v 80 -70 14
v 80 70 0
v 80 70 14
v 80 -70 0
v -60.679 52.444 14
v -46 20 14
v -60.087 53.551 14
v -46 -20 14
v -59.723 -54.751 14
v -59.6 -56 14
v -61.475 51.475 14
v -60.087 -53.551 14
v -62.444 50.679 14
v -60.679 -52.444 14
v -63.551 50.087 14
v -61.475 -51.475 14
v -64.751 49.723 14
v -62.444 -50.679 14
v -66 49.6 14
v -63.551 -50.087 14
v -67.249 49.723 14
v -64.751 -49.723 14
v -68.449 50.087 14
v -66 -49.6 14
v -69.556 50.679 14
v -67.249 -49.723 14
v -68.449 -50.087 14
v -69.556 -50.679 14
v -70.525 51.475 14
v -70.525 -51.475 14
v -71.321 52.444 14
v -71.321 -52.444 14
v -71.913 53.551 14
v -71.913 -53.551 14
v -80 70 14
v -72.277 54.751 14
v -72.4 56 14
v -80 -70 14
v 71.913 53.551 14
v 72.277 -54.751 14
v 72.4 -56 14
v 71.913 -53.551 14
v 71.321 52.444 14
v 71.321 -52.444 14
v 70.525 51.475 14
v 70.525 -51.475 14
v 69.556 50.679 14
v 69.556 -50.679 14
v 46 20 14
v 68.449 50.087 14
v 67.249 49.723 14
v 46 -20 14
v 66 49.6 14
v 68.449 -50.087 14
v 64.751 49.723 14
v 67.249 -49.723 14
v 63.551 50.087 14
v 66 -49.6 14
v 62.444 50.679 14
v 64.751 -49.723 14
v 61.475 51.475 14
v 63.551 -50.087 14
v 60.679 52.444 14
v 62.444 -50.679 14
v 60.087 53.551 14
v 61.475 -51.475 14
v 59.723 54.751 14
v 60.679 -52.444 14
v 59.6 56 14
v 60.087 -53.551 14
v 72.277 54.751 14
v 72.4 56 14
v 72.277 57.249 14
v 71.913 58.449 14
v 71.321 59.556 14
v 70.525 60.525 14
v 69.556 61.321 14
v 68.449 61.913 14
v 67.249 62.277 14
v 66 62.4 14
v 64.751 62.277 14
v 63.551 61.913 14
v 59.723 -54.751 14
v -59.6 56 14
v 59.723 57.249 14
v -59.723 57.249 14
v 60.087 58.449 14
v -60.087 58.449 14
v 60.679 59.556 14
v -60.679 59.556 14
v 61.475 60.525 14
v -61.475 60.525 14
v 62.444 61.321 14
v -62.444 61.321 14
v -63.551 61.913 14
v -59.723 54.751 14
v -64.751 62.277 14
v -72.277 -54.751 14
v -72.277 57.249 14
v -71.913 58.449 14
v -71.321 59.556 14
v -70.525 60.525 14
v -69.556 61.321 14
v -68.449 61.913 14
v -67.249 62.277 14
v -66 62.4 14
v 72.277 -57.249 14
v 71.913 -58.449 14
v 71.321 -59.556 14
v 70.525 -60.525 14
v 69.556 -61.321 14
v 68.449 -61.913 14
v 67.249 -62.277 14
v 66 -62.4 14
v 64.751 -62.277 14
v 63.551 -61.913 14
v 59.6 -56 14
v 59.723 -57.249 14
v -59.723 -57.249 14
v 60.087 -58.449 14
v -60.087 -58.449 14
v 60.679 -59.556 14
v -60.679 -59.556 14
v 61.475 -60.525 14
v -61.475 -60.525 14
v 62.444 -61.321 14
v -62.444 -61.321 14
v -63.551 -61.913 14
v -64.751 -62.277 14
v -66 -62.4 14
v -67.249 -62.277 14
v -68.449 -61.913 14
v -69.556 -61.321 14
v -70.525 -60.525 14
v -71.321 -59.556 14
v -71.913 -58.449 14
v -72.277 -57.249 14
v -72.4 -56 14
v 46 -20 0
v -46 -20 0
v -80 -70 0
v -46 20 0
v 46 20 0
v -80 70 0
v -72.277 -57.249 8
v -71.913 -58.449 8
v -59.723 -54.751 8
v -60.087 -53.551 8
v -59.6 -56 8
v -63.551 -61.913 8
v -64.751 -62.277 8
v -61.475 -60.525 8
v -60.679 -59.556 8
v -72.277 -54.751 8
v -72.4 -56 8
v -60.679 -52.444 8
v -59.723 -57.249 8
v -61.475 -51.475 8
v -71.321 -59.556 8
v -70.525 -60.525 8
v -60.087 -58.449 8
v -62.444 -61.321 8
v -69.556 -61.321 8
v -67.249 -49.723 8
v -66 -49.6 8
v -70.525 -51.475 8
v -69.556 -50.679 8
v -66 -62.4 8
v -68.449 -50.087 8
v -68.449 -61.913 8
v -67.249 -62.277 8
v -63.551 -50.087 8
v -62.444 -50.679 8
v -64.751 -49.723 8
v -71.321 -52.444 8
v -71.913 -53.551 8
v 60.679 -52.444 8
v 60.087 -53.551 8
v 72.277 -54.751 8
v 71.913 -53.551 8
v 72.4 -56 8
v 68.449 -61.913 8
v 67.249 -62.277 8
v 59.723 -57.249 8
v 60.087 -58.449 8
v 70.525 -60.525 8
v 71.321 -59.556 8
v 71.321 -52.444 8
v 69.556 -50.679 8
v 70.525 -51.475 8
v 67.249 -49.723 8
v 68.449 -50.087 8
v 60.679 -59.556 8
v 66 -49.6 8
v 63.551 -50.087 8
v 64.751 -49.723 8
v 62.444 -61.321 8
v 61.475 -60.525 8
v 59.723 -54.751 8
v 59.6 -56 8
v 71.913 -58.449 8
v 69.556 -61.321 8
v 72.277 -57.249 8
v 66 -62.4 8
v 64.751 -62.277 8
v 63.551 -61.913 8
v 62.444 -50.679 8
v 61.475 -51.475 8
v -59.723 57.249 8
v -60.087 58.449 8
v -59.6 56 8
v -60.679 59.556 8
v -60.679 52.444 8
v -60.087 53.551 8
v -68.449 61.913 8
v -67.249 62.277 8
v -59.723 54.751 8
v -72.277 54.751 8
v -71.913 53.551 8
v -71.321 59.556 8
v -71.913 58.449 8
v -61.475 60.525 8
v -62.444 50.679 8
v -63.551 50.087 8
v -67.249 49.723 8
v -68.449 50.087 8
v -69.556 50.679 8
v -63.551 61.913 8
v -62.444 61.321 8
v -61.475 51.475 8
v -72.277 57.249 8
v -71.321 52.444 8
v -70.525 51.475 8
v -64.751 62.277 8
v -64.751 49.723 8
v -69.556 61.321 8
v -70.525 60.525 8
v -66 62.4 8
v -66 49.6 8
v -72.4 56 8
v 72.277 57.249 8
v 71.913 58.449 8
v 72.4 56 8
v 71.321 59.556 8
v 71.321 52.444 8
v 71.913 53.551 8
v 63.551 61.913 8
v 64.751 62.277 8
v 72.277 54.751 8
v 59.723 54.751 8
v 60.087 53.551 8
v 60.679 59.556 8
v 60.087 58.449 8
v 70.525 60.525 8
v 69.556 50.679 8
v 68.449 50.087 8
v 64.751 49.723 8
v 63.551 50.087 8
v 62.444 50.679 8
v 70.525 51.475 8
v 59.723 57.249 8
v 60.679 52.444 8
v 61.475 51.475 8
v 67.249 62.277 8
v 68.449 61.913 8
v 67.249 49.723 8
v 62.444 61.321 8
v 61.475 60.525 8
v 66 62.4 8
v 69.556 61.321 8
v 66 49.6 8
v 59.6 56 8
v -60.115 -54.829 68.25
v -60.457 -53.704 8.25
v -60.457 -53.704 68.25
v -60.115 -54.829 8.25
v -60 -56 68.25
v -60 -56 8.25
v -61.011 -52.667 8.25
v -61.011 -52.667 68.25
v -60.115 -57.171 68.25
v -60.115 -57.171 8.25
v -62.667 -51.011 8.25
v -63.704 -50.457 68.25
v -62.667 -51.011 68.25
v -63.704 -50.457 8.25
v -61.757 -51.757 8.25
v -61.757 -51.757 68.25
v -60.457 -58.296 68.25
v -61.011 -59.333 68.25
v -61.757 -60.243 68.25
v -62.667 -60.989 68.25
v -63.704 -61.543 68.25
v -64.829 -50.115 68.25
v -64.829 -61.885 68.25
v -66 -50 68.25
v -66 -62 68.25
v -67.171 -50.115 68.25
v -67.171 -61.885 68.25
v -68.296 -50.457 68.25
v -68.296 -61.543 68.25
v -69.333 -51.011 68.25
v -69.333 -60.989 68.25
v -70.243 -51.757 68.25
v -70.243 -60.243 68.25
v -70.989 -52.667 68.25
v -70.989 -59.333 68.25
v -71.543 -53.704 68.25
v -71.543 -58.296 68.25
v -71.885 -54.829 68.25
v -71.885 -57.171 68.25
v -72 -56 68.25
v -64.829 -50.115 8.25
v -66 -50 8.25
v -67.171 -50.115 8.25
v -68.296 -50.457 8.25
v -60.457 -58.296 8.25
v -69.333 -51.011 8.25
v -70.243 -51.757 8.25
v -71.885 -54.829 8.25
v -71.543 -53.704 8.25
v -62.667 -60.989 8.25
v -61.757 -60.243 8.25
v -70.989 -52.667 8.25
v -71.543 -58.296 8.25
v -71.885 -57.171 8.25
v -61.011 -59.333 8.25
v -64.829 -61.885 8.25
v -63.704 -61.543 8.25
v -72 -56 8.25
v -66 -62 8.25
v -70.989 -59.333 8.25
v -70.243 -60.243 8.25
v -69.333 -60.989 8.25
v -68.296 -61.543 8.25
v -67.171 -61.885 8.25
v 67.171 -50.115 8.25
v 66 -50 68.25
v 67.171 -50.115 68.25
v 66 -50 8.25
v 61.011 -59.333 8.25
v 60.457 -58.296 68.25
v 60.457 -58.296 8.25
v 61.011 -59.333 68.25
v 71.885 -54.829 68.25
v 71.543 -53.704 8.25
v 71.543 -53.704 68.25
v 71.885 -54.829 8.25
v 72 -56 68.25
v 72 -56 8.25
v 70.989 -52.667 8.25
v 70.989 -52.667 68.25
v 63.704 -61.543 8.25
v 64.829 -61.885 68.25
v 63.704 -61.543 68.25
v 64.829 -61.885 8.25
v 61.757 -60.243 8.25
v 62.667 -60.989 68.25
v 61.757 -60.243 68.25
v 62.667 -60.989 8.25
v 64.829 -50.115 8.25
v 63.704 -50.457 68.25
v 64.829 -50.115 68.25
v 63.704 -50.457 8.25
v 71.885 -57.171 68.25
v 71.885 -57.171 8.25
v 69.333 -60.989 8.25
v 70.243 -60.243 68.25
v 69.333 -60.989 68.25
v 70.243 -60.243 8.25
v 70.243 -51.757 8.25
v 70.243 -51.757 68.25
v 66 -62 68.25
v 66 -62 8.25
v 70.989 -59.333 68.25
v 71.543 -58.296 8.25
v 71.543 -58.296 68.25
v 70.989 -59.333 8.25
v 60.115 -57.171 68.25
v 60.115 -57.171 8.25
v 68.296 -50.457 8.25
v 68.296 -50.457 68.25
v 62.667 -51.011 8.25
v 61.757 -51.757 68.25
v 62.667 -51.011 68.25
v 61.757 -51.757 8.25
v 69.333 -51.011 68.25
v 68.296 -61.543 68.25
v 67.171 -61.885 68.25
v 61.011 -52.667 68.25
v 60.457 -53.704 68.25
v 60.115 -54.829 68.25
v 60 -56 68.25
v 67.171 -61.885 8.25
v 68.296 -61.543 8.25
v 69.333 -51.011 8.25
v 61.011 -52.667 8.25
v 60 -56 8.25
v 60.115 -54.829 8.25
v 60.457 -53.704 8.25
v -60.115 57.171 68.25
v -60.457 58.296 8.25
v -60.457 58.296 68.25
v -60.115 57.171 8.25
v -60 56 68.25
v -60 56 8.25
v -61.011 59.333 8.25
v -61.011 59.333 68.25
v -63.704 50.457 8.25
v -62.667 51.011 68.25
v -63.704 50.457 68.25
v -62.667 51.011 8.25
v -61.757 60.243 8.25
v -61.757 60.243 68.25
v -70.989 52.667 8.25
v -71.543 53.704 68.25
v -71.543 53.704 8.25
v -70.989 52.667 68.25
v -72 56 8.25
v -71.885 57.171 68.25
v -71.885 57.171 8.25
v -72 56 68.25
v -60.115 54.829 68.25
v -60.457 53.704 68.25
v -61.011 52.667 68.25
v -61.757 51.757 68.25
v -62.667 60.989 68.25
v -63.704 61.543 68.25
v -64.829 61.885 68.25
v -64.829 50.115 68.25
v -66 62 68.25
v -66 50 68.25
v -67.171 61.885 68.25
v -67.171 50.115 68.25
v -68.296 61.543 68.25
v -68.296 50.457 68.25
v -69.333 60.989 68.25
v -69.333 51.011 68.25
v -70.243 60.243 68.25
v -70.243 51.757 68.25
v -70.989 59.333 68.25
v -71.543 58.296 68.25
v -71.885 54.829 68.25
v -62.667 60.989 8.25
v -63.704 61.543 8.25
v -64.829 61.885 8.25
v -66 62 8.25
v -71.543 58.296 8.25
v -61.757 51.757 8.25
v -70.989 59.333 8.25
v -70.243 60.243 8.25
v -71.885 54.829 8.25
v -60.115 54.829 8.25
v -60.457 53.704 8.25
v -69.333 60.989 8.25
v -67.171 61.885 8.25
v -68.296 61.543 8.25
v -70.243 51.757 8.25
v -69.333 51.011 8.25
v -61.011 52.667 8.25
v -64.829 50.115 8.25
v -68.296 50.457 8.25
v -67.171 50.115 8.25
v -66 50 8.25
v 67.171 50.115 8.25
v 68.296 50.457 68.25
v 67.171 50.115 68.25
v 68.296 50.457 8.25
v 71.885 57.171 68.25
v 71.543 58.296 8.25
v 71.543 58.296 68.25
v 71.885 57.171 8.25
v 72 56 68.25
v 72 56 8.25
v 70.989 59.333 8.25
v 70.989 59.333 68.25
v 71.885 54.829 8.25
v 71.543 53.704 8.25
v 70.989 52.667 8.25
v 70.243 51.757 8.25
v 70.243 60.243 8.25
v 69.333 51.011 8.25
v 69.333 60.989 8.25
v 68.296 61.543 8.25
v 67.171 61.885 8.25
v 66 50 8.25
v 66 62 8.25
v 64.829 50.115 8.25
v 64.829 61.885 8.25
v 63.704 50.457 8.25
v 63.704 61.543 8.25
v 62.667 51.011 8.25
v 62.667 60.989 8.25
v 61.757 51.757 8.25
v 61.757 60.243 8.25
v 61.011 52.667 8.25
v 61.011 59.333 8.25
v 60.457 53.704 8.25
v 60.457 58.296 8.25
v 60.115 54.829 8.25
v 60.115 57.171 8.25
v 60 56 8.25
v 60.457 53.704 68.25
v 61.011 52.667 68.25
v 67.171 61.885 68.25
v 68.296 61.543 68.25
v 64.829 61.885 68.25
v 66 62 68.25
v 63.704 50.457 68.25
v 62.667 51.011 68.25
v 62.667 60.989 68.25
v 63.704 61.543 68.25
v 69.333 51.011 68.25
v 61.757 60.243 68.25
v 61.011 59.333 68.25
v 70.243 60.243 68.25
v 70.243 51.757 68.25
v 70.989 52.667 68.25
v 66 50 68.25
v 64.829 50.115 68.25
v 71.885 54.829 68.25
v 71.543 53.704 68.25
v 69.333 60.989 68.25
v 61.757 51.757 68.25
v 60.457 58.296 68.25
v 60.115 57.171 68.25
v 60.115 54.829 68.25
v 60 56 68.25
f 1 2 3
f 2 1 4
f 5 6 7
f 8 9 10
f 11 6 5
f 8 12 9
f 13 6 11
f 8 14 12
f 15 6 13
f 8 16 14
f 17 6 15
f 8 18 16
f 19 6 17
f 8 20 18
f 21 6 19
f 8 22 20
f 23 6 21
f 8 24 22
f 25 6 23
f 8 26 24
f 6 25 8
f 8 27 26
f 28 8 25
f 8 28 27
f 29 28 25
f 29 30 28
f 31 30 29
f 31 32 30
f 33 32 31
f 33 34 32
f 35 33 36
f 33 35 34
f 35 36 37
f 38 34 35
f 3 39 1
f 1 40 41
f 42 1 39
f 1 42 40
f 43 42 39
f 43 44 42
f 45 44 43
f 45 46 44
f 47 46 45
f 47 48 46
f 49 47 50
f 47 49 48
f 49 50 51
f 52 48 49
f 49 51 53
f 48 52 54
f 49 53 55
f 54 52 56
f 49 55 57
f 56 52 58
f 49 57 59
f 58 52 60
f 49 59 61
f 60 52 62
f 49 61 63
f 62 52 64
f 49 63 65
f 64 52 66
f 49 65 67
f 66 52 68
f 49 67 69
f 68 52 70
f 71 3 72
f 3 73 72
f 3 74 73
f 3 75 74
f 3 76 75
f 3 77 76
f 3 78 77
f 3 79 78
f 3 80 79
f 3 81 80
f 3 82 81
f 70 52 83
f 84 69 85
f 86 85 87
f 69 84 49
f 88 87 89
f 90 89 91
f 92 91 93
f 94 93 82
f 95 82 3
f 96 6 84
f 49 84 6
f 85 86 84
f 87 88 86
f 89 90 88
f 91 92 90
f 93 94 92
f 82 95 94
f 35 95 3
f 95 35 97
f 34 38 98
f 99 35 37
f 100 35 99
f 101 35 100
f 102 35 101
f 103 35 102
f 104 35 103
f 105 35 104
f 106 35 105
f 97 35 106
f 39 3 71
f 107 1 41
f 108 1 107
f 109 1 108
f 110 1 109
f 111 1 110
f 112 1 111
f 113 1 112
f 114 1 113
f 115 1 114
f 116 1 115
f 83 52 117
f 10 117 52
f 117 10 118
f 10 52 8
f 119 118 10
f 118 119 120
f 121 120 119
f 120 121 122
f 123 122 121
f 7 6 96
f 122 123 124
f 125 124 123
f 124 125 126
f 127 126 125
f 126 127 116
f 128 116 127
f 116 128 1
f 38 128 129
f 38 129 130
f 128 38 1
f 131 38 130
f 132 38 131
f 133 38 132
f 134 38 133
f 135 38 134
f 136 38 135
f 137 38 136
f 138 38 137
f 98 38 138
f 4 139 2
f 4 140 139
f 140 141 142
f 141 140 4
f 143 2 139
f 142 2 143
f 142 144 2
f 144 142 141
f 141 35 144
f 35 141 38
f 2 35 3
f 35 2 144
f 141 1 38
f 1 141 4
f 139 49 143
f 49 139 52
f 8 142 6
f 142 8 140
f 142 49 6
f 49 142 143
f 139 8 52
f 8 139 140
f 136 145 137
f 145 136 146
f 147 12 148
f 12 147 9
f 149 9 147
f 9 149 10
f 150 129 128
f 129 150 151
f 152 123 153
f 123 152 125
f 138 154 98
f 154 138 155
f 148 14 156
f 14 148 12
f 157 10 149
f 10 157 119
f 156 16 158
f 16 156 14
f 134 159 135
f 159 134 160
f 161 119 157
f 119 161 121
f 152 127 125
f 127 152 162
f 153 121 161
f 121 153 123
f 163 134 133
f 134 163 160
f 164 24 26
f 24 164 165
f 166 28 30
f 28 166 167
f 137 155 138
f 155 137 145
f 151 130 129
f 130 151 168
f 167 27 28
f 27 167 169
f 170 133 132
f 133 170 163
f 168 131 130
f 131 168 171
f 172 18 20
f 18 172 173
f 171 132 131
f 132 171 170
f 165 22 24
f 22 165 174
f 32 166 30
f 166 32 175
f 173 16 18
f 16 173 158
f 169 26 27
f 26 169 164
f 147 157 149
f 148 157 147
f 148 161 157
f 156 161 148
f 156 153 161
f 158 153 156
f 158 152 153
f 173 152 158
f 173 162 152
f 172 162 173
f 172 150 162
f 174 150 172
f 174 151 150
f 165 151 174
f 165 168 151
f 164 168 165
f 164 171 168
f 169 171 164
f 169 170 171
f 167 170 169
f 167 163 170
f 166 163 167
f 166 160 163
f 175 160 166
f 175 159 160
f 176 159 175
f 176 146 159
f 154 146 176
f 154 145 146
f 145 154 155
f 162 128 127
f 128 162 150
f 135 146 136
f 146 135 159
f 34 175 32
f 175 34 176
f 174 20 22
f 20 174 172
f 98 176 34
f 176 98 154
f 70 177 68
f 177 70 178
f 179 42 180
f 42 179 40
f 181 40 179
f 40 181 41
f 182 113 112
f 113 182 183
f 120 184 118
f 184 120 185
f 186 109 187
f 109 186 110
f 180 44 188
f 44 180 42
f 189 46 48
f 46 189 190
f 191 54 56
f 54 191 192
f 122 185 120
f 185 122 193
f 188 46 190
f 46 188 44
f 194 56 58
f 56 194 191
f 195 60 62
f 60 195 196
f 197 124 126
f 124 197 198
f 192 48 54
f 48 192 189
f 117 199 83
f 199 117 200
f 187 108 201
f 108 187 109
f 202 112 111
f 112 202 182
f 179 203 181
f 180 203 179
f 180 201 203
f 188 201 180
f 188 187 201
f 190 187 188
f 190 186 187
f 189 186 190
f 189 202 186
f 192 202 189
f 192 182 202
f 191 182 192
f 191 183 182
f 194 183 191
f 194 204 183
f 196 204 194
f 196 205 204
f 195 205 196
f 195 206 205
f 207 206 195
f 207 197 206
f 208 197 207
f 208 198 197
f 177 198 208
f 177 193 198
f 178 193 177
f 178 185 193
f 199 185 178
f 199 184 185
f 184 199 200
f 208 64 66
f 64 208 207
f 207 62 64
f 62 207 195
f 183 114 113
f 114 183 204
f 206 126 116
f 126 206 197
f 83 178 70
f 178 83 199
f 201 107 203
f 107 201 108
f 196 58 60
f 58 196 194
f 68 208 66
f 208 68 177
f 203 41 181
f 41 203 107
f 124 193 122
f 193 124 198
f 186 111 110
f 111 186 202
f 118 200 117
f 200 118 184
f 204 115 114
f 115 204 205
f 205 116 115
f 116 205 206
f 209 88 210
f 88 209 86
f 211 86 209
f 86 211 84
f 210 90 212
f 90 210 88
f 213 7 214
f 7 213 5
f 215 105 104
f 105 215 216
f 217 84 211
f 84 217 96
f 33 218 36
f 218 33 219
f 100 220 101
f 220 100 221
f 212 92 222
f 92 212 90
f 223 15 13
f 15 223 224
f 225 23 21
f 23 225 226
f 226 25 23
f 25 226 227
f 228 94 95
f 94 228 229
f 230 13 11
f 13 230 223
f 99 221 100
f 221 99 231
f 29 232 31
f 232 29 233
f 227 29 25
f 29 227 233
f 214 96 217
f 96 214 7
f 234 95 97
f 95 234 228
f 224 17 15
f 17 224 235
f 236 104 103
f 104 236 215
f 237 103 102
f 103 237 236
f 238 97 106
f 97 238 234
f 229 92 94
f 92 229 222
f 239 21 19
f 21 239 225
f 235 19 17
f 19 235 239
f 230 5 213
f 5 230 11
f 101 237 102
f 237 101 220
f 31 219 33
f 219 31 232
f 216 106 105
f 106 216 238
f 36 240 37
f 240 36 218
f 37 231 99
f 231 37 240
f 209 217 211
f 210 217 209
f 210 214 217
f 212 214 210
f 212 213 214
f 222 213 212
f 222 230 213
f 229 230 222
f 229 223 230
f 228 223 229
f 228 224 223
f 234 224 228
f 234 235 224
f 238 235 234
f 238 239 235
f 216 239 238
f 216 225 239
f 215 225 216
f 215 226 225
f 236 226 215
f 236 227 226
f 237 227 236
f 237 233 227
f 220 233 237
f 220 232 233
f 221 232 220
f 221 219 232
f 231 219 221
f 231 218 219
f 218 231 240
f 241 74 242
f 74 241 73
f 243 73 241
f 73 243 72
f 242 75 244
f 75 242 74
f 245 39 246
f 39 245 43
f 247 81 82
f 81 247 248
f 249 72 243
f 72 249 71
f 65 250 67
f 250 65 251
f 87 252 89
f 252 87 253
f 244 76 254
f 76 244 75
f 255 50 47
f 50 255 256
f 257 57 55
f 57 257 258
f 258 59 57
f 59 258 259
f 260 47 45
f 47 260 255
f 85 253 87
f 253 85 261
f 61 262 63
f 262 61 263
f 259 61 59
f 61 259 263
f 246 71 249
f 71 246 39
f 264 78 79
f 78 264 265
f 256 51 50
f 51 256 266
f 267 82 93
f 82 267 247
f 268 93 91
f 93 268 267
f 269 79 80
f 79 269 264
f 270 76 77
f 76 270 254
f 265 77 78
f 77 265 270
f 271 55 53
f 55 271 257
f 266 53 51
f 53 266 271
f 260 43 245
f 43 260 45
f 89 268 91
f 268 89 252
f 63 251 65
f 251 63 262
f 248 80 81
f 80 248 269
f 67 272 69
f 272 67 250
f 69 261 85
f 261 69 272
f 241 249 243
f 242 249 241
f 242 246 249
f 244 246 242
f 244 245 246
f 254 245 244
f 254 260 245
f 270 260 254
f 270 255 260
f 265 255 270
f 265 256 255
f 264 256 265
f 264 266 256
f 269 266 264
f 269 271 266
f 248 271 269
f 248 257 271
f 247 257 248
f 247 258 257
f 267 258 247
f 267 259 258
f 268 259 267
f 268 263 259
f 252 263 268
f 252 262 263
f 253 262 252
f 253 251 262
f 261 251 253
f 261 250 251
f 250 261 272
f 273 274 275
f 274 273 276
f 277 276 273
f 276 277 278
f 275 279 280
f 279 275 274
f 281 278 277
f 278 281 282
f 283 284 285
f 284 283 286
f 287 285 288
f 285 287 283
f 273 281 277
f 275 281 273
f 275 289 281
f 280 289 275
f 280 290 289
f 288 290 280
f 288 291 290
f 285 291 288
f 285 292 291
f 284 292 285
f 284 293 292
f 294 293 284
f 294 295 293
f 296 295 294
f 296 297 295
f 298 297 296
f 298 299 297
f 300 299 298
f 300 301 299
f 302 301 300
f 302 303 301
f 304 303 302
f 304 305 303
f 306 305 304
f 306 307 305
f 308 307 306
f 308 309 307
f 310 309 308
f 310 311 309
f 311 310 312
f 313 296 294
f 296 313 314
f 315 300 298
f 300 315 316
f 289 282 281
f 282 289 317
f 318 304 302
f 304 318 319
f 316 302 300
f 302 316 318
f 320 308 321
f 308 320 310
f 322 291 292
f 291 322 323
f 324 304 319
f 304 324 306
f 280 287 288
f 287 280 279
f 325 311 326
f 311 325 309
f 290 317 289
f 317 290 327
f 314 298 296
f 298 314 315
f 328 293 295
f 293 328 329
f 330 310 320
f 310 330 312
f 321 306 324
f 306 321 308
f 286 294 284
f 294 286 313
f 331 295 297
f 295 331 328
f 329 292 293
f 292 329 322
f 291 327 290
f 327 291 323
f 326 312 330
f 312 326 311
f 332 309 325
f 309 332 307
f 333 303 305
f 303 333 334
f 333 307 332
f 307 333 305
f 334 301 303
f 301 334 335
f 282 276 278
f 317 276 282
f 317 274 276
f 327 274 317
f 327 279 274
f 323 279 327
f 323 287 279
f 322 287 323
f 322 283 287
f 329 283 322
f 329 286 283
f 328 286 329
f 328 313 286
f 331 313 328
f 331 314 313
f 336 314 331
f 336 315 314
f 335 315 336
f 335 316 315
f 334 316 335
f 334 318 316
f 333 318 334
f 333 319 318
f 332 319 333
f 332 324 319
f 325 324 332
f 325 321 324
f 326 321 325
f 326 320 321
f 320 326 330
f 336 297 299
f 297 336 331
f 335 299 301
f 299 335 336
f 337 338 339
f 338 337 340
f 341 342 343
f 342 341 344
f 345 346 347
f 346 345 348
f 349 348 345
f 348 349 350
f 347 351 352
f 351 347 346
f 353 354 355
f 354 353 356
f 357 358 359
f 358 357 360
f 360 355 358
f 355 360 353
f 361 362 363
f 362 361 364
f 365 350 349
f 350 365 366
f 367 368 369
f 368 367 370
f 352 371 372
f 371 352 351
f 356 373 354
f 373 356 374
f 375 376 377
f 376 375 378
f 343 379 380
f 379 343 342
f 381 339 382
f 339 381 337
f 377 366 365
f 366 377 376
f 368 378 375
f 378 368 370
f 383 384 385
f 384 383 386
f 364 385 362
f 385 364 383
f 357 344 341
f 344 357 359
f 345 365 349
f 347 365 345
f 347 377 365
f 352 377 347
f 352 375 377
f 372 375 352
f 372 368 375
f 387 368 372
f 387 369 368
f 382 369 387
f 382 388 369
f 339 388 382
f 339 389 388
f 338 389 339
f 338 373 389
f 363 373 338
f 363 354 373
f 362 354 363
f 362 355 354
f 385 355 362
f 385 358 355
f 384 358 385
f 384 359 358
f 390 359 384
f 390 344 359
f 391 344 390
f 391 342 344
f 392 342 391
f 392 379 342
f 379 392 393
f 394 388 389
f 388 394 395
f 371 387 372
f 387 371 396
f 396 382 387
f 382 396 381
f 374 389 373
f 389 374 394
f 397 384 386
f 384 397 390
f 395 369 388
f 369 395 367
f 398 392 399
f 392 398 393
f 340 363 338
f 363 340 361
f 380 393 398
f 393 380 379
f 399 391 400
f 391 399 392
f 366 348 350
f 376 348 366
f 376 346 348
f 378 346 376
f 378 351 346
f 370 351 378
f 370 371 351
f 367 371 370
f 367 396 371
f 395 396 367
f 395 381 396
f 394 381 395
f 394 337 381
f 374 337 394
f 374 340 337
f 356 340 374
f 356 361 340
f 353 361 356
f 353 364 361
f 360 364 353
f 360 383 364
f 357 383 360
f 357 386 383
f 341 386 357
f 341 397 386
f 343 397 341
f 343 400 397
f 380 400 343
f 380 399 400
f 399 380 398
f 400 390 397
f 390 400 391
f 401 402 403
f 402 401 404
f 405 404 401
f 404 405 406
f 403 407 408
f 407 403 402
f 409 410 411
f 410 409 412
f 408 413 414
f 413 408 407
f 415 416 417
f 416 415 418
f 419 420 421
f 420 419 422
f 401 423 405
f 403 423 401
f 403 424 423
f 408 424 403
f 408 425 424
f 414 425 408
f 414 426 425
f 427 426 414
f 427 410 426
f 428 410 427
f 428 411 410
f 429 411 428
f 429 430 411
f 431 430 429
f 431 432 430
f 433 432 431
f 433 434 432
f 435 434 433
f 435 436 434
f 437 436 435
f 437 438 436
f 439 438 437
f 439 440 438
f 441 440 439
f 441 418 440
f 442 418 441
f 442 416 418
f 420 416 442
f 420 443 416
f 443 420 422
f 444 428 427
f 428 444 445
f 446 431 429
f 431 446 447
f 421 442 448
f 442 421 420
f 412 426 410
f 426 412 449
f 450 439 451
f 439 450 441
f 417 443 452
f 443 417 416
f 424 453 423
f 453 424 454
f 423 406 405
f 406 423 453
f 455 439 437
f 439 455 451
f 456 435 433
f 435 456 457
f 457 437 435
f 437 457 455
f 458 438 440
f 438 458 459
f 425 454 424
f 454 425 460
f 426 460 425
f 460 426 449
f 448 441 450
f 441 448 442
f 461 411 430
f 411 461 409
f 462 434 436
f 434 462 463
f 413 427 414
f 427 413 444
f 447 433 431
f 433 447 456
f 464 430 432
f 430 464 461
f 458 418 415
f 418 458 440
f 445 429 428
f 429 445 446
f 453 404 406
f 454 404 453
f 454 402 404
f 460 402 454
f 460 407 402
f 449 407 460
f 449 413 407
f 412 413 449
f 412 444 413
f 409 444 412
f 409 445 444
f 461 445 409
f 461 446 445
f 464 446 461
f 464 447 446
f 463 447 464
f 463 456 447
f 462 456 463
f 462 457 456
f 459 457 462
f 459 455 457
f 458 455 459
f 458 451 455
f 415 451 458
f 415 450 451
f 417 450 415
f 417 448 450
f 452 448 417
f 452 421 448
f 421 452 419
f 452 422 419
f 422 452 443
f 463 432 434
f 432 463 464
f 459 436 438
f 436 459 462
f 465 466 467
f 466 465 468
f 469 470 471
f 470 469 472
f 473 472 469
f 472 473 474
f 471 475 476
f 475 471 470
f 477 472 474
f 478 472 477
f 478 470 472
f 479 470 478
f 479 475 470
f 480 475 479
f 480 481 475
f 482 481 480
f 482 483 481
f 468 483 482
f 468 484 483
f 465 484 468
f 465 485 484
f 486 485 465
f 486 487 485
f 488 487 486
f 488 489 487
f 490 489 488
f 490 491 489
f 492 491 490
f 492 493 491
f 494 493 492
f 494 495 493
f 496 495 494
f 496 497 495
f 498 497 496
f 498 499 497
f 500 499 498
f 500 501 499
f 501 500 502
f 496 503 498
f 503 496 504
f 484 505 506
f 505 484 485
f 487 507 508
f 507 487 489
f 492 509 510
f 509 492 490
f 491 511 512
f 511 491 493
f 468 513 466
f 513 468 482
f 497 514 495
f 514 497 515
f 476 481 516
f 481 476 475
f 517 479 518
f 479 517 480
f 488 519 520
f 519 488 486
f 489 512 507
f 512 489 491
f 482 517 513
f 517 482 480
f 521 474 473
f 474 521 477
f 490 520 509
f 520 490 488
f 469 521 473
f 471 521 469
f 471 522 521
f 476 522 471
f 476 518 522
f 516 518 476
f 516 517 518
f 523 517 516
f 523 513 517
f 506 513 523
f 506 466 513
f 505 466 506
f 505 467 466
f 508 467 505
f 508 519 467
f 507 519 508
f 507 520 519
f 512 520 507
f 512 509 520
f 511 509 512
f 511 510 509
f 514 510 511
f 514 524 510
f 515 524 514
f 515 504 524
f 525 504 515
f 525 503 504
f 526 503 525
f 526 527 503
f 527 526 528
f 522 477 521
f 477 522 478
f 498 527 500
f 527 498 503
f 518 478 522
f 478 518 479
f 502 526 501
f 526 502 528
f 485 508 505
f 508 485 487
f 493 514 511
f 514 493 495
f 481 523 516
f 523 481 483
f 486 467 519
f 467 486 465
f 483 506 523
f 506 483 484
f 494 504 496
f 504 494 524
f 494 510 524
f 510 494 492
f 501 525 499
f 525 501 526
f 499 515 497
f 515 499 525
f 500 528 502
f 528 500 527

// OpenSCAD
$fn = 32;

// ------------------------------------------------------------------------
// Frame with four posts: 160 x 140 mm frame, four d12 posts
// Every part is its own module, assembly() places them once.
// ------------------------------------------------------------------------

// --- part 1 ---
module base_frame() {
  difference() {
    translate([-80, -70, 0]) cube([160, 140, 14]);
    translate([-46, -20, -1]) cube([92, 40, 16]);
    translate([-66, -56, 8]) cylinder(h = 7, d = 12.8);
    translate([66, -56, 8]) cylinder(h = 7, d = 12.8);
    translate([-66, 56, 8]) cylinder(h = 7, d = 12.8);
    translate([66, 56, 8]) cylinder(h = 7, d = 12.8);
  }
}

// --- part 2 ---
module post1() {
  cylinder(h = 60, d = 12);
}

// --- part 3 ---
module post2() {
  cylinder(h = 60, d = 12);
}

// --- part 4 ---
module post3() {
  cylinder(h = 60, d = 12);
}

// --- part 5 ---
module post4() {
  cylinder(h = 60, d = 12);
}

// --- assembly ---
module assembly() {
  translate([0, 0, 0]) rotate([0, 0, 0]) base_frame();
  translate([-66, -56, 8.25]) rotate([0, 0, 0]) post1();
  translate([66, -56, 8.25]) rotate([0, 0, 0]) post2();
  translate([-66, 56, 8.25]) rotate([0, 0, 0]) post3();
  translate([66, 56, 8.25]) rotate([0, 0, 0]) post4();
}

assembly();
